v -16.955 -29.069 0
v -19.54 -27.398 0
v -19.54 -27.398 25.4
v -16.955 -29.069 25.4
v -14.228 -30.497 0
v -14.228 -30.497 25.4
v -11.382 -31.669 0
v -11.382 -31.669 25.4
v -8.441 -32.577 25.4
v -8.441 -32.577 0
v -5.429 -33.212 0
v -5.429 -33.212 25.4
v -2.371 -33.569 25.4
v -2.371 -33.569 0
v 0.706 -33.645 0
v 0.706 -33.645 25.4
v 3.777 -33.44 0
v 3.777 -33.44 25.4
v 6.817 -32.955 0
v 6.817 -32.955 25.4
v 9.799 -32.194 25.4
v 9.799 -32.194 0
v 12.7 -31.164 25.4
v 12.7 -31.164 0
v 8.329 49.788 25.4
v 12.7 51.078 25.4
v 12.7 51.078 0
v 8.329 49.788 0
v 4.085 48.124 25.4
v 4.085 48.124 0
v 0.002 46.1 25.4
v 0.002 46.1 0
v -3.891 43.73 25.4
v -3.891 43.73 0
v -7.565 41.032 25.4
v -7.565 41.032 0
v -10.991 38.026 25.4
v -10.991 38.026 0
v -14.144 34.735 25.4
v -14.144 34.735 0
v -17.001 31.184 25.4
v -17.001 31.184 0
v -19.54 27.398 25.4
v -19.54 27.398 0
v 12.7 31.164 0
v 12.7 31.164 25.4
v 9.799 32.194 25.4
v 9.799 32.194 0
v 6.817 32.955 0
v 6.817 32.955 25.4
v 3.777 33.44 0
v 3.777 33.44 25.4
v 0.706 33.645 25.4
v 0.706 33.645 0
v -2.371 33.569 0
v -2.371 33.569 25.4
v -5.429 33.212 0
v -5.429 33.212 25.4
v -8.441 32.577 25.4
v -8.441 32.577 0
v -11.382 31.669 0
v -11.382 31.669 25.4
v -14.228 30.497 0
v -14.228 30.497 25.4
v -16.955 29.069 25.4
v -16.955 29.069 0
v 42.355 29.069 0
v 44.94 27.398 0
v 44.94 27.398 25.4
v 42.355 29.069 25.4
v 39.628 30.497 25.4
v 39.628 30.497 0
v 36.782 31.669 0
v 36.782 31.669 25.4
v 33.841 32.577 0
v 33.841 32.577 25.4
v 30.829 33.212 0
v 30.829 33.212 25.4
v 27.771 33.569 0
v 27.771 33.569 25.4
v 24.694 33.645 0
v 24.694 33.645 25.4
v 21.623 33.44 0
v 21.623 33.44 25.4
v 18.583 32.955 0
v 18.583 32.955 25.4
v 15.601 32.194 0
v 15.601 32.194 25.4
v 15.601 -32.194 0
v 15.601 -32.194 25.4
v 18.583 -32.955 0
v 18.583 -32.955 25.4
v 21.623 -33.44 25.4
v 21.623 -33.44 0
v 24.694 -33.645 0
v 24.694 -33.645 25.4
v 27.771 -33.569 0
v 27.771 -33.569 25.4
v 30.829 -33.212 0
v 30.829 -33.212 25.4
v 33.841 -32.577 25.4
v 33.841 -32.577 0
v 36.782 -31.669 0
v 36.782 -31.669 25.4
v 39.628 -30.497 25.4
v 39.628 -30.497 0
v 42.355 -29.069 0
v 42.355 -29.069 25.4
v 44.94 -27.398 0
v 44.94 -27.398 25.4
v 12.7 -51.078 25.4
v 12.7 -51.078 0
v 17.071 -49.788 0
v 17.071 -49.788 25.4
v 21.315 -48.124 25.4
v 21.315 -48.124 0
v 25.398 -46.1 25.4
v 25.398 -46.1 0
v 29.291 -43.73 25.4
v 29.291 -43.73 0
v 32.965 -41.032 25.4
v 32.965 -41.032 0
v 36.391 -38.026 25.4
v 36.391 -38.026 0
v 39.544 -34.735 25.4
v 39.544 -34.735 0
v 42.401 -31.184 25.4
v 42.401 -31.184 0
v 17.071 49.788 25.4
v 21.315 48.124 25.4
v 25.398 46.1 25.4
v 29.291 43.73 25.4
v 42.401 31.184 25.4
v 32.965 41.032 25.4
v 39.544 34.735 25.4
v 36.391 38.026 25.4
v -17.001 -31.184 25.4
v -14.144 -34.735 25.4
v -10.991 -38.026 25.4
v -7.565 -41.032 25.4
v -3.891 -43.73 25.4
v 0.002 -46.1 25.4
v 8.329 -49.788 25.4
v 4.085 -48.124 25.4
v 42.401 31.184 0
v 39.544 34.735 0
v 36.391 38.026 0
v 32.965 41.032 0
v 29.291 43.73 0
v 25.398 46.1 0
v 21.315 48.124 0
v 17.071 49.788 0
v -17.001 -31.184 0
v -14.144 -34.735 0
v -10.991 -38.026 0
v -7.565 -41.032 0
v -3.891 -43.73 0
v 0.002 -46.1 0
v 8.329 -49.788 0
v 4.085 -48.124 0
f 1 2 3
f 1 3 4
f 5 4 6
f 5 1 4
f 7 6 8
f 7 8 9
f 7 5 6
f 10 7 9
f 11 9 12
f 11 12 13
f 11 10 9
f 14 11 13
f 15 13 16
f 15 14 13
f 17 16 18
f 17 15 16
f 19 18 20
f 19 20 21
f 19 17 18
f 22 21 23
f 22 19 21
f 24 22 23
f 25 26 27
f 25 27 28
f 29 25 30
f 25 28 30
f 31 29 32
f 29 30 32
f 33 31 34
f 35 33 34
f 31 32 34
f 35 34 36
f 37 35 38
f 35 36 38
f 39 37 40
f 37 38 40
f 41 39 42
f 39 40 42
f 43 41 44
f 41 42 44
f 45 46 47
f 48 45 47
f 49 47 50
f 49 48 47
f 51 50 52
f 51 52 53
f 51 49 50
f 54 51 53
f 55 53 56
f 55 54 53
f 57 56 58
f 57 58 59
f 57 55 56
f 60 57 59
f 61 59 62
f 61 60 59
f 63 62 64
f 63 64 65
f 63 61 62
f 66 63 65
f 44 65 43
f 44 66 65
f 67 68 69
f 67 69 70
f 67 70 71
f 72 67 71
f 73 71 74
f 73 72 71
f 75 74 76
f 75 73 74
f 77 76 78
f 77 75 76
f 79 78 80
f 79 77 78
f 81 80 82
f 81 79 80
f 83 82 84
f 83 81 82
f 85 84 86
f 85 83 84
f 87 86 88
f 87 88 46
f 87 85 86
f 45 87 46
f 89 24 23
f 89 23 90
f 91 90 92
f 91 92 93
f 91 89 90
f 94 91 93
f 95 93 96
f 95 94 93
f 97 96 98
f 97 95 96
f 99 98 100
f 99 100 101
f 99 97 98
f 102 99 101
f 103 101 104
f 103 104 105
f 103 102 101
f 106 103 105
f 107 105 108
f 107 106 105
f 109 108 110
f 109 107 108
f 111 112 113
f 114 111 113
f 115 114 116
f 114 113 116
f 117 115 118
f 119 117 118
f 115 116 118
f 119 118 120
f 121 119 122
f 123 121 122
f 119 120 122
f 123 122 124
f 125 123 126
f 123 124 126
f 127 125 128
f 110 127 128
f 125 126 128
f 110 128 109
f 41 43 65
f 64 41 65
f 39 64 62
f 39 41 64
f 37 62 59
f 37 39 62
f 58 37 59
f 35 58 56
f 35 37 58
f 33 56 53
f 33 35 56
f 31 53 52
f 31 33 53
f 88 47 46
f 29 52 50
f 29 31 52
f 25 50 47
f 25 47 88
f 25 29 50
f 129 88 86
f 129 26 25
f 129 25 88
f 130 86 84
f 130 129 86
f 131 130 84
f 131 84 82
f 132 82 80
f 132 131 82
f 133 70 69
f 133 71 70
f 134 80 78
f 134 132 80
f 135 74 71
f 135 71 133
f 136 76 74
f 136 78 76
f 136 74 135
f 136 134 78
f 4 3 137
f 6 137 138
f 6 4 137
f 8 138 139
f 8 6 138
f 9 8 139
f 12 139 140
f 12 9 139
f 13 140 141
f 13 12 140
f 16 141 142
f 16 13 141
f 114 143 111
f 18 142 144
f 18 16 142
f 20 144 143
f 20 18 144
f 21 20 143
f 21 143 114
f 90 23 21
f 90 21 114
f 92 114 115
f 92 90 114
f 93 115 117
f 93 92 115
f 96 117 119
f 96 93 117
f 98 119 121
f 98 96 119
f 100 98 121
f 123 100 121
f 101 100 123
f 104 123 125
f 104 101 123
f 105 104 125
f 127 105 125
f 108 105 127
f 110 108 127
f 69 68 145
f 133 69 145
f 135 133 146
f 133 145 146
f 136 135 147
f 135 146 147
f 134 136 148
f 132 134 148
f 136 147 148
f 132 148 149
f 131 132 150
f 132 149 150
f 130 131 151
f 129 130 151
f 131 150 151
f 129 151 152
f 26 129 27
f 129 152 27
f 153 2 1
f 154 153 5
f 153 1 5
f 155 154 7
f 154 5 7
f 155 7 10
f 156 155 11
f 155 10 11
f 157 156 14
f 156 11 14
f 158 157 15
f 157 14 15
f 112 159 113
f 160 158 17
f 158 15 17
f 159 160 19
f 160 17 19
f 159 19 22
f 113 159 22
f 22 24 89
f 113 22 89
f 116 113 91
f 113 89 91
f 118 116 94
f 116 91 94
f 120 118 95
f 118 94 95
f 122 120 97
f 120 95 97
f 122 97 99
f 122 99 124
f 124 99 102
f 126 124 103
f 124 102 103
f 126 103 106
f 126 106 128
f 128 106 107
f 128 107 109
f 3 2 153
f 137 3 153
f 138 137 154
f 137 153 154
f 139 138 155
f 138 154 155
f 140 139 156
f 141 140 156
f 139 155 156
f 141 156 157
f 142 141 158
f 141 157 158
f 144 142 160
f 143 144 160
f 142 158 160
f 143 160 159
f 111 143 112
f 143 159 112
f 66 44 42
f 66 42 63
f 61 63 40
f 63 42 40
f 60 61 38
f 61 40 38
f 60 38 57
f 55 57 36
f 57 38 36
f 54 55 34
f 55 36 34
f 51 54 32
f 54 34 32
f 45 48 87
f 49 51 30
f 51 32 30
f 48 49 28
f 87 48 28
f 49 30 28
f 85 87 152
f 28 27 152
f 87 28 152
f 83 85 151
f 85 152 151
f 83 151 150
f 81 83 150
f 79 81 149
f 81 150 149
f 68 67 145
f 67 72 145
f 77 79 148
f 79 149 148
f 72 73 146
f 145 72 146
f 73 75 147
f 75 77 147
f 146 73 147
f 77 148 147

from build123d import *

# Parameters (mm, degrees)
F0_R     = 52.633452
F0_R_2   = 33.65242
F1_DEPTH = 25.4


with BuildPart() as f1:
    # F0 (on Top) → F1 (new body)
    with BuildSketch(Plane.XY):
        Circle(F0_R)
        Circle(F0_R_2, mode=Mode.SUBTRACT)
    extrude(amount=F1_DEPTH)


with BuildPart() as f2_1:
    # F2: copy of F1
    add(f1.part.moved(Location((25.4, 0, 0))))


with BuildPart() as f1_1:
    add(f1.part)

    # F3: intersect F2_1
    add(f2_1.part, mode=Mode.INTERSECT)


solid = f1_1.part
